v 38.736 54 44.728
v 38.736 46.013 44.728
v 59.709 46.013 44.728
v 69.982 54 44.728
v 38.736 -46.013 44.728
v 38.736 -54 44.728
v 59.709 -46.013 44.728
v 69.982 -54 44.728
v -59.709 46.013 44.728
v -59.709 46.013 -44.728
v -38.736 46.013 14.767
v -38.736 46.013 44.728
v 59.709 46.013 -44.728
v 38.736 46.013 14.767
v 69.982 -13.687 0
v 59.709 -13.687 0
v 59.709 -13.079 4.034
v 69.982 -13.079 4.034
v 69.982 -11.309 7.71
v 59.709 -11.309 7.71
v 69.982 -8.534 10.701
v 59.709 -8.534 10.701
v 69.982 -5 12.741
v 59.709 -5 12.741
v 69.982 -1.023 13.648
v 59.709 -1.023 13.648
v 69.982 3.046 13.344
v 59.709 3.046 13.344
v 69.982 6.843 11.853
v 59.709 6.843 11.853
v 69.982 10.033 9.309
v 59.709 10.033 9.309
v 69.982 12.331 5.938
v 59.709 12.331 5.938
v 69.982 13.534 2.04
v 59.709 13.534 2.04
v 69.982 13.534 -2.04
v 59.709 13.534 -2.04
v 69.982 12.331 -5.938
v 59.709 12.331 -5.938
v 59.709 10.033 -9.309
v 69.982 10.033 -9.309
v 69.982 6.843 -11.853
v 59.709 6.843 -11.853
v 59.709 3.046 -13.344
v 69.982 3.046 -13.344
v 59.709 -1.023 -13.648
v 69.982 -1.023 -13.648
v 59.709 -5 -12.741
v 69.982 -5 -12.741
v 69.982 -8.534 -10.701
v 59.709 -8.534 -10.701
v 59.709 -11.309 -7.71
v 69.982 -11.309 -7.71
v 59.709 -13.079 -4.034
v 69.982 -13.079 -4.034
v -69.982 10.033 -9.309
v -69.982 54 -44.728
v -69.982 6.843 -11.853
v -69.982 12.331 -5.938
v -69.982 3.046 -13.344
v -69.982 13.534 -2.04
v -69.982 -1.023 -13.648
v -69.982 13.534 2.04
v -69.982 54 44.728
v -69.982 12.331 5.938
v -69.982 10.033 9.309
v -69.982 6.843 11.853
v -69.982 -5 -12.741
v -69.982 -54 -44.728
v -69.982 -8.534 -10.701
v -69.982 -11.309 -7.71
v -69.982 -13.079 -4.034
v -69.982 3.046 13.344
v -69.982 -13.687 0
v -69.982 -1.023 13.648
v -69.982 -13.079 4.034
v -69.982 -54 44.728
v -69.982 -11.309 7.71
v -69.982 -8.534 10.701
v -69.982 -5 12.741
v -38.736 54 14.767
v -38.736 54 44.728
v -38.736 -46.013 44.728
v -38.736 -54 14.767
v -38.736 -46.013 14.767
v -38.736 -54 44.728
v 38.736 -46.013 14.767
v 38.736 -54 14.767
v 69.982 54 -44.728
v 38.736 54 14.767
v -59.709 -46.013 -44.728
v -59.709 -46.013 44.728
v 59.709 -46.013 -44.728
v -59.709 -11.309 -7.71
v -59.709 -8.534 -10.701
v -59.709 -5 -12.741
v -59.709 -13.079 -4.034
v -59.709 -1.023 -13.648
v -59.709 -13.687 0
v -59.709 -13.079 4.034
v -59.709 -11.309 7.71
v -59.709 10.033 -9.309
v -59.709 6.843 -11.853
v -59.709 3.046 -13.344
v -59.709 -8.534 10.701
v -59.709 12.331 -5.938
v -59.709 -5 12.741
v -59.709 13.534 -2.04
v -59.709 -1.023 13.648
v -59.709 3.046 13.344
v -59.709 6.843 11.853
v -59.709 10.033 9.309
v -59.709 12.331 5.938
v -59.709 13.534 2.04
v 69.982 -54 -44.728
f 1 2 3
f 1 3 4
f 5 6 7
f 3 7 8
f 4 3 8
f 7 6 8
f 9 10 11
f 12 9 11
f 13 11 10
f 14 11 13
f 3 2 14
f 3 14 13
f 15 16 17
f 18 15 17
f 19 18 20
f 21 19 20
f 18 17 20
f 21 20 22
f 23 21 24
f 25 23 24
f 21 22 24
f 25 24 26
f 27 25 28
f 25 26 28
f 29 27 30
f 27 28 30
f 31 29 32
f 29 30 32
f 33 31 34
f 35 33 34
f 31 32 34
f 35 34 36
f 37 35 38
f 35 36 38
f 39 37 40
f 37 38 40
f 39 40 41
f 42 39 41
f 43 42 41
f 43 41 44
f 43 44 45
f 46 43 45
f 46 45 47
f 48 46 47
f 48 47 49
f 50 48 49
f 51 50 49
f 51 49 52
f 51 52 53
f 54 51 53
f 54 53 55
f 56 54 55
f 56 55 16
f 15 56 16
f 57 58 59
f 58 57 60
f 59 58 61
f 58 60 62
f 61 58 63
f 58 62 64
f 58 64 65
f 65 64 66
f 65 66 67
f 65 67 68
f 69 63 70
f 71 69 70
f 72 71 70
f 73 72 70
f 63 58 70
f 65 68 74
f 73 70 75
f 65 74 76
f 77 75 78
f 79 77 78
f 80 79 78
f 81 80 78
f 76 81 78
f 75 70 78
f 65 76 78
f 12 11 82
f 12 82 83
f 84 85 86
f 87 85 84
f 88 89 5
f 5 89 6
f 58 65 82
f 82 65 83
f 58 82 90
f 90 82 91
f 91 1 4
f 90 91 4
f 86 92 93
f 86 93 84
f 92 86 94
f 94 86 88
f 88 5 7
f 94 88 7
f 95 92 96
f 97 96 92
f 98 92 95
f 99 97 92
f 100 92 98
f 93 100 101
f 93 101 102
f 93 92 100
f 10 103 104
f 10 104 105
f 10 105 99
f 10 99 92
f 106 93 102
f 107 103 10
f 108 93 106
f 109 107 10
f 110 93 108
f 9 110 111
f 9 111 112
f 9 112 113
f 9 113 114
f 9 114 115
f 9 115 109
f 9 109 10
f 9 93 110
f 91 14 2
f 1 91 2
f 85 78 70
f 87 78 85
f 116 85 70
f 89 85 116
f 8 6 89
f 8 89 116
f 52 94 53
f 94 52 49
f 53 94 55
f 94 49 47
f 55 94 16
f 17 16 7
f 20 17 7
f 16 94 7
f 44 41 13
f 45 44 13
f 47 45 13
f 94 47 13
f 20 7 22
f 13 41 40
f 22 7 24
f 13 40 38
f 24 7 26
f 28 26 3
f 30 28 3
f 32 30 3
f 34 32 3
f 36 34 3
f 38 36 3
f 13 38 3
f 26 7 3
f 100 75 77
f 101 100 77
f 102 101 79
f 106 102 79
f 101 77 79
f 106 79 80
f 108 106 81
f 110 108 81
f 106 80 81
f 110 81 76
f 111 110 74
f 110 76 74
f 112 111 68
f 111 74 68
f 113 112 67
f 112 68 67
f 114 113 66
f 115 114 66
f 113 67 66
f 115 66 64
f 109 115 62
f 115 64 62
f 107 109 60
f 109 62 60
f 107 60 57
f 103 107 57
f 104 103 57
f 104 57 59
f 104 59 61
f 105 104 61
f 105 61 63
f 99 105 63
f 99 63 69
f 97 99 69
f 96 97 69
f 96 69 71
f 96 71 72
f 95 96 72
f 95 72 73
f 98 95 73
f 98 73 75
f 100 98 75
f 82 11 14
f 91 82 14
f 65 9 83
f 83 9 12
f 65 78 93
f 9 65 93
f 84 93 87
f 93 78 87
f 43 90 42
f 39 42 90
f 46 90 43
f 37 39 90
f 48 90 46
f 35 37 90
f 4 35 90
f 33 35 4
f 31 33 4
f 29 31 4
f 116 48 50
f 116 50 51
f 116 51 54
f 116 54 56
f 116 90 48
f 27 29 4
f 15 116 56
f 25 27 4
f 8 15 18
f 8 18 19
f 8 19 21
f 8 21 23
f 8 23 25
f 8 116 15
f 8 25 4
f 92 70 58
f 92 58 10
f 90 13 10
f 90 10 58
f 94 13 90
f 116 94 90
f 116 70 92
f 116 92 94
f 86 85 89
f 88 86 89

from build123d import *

# Parameters (mm, degrees)
F0_W     = 139.96376
F0_H     = 89.45696
F1_DEPTH = 54
F3_W     = 119.418622
F3_H     = 92.025094
F4_DEPTH = 98
F5_W     = 77.472278
F5_H     = 29.961662
F6_DEPTH = 195
F7_R     = 13.686729
F8_DEPTH = 202


with BuildPart() as f1:
    # F0 (on Front) → F1 (new body)
    with BuildSketch(Plane.XZ):
        Rectangle(F0_W, F0_H)
    extrude(amount=F1_DEPTH)

    # F2: F1 across face


with BuildPart() as f1_1:
    add(f1.part)
    add(f1.part.mirror(Plane(origin=(0, 0, 0), x_dir=(1, 0, 0), z_dir=(0, 1, 0))))

    # F3 (on face) → F4 (cut)
    with BuildSketch(Plane.XY.offset(44.72848)):
        Rectangle(F3_W, F3_H)
    extrude(amount=-F4_DEPTH, mode=Mode.SUBTRACT)

    # F5 (on face) → F6 (cut)
    with BuildSketch(Plane.XZ.offset(54)):
        with Locations((1e-06, 29.747649)):
            Rectangle(F5_W, F5_H)
    extrude(amount=-F6_DEPTH, mode=Mode.SUBTRACT)

    # F7 (on face) → F8 (cut)
    with BuildSketch(Plane(origin=(-69.98188, 0, 0), x_dir=(0, -1, 0), z_dir=(-1, 0, 0))):
        Circle(F7_R)
    extrude(amount=-F8_DEPTH, mode=Mode.SUBTRACT)


solid = f1_1.part
